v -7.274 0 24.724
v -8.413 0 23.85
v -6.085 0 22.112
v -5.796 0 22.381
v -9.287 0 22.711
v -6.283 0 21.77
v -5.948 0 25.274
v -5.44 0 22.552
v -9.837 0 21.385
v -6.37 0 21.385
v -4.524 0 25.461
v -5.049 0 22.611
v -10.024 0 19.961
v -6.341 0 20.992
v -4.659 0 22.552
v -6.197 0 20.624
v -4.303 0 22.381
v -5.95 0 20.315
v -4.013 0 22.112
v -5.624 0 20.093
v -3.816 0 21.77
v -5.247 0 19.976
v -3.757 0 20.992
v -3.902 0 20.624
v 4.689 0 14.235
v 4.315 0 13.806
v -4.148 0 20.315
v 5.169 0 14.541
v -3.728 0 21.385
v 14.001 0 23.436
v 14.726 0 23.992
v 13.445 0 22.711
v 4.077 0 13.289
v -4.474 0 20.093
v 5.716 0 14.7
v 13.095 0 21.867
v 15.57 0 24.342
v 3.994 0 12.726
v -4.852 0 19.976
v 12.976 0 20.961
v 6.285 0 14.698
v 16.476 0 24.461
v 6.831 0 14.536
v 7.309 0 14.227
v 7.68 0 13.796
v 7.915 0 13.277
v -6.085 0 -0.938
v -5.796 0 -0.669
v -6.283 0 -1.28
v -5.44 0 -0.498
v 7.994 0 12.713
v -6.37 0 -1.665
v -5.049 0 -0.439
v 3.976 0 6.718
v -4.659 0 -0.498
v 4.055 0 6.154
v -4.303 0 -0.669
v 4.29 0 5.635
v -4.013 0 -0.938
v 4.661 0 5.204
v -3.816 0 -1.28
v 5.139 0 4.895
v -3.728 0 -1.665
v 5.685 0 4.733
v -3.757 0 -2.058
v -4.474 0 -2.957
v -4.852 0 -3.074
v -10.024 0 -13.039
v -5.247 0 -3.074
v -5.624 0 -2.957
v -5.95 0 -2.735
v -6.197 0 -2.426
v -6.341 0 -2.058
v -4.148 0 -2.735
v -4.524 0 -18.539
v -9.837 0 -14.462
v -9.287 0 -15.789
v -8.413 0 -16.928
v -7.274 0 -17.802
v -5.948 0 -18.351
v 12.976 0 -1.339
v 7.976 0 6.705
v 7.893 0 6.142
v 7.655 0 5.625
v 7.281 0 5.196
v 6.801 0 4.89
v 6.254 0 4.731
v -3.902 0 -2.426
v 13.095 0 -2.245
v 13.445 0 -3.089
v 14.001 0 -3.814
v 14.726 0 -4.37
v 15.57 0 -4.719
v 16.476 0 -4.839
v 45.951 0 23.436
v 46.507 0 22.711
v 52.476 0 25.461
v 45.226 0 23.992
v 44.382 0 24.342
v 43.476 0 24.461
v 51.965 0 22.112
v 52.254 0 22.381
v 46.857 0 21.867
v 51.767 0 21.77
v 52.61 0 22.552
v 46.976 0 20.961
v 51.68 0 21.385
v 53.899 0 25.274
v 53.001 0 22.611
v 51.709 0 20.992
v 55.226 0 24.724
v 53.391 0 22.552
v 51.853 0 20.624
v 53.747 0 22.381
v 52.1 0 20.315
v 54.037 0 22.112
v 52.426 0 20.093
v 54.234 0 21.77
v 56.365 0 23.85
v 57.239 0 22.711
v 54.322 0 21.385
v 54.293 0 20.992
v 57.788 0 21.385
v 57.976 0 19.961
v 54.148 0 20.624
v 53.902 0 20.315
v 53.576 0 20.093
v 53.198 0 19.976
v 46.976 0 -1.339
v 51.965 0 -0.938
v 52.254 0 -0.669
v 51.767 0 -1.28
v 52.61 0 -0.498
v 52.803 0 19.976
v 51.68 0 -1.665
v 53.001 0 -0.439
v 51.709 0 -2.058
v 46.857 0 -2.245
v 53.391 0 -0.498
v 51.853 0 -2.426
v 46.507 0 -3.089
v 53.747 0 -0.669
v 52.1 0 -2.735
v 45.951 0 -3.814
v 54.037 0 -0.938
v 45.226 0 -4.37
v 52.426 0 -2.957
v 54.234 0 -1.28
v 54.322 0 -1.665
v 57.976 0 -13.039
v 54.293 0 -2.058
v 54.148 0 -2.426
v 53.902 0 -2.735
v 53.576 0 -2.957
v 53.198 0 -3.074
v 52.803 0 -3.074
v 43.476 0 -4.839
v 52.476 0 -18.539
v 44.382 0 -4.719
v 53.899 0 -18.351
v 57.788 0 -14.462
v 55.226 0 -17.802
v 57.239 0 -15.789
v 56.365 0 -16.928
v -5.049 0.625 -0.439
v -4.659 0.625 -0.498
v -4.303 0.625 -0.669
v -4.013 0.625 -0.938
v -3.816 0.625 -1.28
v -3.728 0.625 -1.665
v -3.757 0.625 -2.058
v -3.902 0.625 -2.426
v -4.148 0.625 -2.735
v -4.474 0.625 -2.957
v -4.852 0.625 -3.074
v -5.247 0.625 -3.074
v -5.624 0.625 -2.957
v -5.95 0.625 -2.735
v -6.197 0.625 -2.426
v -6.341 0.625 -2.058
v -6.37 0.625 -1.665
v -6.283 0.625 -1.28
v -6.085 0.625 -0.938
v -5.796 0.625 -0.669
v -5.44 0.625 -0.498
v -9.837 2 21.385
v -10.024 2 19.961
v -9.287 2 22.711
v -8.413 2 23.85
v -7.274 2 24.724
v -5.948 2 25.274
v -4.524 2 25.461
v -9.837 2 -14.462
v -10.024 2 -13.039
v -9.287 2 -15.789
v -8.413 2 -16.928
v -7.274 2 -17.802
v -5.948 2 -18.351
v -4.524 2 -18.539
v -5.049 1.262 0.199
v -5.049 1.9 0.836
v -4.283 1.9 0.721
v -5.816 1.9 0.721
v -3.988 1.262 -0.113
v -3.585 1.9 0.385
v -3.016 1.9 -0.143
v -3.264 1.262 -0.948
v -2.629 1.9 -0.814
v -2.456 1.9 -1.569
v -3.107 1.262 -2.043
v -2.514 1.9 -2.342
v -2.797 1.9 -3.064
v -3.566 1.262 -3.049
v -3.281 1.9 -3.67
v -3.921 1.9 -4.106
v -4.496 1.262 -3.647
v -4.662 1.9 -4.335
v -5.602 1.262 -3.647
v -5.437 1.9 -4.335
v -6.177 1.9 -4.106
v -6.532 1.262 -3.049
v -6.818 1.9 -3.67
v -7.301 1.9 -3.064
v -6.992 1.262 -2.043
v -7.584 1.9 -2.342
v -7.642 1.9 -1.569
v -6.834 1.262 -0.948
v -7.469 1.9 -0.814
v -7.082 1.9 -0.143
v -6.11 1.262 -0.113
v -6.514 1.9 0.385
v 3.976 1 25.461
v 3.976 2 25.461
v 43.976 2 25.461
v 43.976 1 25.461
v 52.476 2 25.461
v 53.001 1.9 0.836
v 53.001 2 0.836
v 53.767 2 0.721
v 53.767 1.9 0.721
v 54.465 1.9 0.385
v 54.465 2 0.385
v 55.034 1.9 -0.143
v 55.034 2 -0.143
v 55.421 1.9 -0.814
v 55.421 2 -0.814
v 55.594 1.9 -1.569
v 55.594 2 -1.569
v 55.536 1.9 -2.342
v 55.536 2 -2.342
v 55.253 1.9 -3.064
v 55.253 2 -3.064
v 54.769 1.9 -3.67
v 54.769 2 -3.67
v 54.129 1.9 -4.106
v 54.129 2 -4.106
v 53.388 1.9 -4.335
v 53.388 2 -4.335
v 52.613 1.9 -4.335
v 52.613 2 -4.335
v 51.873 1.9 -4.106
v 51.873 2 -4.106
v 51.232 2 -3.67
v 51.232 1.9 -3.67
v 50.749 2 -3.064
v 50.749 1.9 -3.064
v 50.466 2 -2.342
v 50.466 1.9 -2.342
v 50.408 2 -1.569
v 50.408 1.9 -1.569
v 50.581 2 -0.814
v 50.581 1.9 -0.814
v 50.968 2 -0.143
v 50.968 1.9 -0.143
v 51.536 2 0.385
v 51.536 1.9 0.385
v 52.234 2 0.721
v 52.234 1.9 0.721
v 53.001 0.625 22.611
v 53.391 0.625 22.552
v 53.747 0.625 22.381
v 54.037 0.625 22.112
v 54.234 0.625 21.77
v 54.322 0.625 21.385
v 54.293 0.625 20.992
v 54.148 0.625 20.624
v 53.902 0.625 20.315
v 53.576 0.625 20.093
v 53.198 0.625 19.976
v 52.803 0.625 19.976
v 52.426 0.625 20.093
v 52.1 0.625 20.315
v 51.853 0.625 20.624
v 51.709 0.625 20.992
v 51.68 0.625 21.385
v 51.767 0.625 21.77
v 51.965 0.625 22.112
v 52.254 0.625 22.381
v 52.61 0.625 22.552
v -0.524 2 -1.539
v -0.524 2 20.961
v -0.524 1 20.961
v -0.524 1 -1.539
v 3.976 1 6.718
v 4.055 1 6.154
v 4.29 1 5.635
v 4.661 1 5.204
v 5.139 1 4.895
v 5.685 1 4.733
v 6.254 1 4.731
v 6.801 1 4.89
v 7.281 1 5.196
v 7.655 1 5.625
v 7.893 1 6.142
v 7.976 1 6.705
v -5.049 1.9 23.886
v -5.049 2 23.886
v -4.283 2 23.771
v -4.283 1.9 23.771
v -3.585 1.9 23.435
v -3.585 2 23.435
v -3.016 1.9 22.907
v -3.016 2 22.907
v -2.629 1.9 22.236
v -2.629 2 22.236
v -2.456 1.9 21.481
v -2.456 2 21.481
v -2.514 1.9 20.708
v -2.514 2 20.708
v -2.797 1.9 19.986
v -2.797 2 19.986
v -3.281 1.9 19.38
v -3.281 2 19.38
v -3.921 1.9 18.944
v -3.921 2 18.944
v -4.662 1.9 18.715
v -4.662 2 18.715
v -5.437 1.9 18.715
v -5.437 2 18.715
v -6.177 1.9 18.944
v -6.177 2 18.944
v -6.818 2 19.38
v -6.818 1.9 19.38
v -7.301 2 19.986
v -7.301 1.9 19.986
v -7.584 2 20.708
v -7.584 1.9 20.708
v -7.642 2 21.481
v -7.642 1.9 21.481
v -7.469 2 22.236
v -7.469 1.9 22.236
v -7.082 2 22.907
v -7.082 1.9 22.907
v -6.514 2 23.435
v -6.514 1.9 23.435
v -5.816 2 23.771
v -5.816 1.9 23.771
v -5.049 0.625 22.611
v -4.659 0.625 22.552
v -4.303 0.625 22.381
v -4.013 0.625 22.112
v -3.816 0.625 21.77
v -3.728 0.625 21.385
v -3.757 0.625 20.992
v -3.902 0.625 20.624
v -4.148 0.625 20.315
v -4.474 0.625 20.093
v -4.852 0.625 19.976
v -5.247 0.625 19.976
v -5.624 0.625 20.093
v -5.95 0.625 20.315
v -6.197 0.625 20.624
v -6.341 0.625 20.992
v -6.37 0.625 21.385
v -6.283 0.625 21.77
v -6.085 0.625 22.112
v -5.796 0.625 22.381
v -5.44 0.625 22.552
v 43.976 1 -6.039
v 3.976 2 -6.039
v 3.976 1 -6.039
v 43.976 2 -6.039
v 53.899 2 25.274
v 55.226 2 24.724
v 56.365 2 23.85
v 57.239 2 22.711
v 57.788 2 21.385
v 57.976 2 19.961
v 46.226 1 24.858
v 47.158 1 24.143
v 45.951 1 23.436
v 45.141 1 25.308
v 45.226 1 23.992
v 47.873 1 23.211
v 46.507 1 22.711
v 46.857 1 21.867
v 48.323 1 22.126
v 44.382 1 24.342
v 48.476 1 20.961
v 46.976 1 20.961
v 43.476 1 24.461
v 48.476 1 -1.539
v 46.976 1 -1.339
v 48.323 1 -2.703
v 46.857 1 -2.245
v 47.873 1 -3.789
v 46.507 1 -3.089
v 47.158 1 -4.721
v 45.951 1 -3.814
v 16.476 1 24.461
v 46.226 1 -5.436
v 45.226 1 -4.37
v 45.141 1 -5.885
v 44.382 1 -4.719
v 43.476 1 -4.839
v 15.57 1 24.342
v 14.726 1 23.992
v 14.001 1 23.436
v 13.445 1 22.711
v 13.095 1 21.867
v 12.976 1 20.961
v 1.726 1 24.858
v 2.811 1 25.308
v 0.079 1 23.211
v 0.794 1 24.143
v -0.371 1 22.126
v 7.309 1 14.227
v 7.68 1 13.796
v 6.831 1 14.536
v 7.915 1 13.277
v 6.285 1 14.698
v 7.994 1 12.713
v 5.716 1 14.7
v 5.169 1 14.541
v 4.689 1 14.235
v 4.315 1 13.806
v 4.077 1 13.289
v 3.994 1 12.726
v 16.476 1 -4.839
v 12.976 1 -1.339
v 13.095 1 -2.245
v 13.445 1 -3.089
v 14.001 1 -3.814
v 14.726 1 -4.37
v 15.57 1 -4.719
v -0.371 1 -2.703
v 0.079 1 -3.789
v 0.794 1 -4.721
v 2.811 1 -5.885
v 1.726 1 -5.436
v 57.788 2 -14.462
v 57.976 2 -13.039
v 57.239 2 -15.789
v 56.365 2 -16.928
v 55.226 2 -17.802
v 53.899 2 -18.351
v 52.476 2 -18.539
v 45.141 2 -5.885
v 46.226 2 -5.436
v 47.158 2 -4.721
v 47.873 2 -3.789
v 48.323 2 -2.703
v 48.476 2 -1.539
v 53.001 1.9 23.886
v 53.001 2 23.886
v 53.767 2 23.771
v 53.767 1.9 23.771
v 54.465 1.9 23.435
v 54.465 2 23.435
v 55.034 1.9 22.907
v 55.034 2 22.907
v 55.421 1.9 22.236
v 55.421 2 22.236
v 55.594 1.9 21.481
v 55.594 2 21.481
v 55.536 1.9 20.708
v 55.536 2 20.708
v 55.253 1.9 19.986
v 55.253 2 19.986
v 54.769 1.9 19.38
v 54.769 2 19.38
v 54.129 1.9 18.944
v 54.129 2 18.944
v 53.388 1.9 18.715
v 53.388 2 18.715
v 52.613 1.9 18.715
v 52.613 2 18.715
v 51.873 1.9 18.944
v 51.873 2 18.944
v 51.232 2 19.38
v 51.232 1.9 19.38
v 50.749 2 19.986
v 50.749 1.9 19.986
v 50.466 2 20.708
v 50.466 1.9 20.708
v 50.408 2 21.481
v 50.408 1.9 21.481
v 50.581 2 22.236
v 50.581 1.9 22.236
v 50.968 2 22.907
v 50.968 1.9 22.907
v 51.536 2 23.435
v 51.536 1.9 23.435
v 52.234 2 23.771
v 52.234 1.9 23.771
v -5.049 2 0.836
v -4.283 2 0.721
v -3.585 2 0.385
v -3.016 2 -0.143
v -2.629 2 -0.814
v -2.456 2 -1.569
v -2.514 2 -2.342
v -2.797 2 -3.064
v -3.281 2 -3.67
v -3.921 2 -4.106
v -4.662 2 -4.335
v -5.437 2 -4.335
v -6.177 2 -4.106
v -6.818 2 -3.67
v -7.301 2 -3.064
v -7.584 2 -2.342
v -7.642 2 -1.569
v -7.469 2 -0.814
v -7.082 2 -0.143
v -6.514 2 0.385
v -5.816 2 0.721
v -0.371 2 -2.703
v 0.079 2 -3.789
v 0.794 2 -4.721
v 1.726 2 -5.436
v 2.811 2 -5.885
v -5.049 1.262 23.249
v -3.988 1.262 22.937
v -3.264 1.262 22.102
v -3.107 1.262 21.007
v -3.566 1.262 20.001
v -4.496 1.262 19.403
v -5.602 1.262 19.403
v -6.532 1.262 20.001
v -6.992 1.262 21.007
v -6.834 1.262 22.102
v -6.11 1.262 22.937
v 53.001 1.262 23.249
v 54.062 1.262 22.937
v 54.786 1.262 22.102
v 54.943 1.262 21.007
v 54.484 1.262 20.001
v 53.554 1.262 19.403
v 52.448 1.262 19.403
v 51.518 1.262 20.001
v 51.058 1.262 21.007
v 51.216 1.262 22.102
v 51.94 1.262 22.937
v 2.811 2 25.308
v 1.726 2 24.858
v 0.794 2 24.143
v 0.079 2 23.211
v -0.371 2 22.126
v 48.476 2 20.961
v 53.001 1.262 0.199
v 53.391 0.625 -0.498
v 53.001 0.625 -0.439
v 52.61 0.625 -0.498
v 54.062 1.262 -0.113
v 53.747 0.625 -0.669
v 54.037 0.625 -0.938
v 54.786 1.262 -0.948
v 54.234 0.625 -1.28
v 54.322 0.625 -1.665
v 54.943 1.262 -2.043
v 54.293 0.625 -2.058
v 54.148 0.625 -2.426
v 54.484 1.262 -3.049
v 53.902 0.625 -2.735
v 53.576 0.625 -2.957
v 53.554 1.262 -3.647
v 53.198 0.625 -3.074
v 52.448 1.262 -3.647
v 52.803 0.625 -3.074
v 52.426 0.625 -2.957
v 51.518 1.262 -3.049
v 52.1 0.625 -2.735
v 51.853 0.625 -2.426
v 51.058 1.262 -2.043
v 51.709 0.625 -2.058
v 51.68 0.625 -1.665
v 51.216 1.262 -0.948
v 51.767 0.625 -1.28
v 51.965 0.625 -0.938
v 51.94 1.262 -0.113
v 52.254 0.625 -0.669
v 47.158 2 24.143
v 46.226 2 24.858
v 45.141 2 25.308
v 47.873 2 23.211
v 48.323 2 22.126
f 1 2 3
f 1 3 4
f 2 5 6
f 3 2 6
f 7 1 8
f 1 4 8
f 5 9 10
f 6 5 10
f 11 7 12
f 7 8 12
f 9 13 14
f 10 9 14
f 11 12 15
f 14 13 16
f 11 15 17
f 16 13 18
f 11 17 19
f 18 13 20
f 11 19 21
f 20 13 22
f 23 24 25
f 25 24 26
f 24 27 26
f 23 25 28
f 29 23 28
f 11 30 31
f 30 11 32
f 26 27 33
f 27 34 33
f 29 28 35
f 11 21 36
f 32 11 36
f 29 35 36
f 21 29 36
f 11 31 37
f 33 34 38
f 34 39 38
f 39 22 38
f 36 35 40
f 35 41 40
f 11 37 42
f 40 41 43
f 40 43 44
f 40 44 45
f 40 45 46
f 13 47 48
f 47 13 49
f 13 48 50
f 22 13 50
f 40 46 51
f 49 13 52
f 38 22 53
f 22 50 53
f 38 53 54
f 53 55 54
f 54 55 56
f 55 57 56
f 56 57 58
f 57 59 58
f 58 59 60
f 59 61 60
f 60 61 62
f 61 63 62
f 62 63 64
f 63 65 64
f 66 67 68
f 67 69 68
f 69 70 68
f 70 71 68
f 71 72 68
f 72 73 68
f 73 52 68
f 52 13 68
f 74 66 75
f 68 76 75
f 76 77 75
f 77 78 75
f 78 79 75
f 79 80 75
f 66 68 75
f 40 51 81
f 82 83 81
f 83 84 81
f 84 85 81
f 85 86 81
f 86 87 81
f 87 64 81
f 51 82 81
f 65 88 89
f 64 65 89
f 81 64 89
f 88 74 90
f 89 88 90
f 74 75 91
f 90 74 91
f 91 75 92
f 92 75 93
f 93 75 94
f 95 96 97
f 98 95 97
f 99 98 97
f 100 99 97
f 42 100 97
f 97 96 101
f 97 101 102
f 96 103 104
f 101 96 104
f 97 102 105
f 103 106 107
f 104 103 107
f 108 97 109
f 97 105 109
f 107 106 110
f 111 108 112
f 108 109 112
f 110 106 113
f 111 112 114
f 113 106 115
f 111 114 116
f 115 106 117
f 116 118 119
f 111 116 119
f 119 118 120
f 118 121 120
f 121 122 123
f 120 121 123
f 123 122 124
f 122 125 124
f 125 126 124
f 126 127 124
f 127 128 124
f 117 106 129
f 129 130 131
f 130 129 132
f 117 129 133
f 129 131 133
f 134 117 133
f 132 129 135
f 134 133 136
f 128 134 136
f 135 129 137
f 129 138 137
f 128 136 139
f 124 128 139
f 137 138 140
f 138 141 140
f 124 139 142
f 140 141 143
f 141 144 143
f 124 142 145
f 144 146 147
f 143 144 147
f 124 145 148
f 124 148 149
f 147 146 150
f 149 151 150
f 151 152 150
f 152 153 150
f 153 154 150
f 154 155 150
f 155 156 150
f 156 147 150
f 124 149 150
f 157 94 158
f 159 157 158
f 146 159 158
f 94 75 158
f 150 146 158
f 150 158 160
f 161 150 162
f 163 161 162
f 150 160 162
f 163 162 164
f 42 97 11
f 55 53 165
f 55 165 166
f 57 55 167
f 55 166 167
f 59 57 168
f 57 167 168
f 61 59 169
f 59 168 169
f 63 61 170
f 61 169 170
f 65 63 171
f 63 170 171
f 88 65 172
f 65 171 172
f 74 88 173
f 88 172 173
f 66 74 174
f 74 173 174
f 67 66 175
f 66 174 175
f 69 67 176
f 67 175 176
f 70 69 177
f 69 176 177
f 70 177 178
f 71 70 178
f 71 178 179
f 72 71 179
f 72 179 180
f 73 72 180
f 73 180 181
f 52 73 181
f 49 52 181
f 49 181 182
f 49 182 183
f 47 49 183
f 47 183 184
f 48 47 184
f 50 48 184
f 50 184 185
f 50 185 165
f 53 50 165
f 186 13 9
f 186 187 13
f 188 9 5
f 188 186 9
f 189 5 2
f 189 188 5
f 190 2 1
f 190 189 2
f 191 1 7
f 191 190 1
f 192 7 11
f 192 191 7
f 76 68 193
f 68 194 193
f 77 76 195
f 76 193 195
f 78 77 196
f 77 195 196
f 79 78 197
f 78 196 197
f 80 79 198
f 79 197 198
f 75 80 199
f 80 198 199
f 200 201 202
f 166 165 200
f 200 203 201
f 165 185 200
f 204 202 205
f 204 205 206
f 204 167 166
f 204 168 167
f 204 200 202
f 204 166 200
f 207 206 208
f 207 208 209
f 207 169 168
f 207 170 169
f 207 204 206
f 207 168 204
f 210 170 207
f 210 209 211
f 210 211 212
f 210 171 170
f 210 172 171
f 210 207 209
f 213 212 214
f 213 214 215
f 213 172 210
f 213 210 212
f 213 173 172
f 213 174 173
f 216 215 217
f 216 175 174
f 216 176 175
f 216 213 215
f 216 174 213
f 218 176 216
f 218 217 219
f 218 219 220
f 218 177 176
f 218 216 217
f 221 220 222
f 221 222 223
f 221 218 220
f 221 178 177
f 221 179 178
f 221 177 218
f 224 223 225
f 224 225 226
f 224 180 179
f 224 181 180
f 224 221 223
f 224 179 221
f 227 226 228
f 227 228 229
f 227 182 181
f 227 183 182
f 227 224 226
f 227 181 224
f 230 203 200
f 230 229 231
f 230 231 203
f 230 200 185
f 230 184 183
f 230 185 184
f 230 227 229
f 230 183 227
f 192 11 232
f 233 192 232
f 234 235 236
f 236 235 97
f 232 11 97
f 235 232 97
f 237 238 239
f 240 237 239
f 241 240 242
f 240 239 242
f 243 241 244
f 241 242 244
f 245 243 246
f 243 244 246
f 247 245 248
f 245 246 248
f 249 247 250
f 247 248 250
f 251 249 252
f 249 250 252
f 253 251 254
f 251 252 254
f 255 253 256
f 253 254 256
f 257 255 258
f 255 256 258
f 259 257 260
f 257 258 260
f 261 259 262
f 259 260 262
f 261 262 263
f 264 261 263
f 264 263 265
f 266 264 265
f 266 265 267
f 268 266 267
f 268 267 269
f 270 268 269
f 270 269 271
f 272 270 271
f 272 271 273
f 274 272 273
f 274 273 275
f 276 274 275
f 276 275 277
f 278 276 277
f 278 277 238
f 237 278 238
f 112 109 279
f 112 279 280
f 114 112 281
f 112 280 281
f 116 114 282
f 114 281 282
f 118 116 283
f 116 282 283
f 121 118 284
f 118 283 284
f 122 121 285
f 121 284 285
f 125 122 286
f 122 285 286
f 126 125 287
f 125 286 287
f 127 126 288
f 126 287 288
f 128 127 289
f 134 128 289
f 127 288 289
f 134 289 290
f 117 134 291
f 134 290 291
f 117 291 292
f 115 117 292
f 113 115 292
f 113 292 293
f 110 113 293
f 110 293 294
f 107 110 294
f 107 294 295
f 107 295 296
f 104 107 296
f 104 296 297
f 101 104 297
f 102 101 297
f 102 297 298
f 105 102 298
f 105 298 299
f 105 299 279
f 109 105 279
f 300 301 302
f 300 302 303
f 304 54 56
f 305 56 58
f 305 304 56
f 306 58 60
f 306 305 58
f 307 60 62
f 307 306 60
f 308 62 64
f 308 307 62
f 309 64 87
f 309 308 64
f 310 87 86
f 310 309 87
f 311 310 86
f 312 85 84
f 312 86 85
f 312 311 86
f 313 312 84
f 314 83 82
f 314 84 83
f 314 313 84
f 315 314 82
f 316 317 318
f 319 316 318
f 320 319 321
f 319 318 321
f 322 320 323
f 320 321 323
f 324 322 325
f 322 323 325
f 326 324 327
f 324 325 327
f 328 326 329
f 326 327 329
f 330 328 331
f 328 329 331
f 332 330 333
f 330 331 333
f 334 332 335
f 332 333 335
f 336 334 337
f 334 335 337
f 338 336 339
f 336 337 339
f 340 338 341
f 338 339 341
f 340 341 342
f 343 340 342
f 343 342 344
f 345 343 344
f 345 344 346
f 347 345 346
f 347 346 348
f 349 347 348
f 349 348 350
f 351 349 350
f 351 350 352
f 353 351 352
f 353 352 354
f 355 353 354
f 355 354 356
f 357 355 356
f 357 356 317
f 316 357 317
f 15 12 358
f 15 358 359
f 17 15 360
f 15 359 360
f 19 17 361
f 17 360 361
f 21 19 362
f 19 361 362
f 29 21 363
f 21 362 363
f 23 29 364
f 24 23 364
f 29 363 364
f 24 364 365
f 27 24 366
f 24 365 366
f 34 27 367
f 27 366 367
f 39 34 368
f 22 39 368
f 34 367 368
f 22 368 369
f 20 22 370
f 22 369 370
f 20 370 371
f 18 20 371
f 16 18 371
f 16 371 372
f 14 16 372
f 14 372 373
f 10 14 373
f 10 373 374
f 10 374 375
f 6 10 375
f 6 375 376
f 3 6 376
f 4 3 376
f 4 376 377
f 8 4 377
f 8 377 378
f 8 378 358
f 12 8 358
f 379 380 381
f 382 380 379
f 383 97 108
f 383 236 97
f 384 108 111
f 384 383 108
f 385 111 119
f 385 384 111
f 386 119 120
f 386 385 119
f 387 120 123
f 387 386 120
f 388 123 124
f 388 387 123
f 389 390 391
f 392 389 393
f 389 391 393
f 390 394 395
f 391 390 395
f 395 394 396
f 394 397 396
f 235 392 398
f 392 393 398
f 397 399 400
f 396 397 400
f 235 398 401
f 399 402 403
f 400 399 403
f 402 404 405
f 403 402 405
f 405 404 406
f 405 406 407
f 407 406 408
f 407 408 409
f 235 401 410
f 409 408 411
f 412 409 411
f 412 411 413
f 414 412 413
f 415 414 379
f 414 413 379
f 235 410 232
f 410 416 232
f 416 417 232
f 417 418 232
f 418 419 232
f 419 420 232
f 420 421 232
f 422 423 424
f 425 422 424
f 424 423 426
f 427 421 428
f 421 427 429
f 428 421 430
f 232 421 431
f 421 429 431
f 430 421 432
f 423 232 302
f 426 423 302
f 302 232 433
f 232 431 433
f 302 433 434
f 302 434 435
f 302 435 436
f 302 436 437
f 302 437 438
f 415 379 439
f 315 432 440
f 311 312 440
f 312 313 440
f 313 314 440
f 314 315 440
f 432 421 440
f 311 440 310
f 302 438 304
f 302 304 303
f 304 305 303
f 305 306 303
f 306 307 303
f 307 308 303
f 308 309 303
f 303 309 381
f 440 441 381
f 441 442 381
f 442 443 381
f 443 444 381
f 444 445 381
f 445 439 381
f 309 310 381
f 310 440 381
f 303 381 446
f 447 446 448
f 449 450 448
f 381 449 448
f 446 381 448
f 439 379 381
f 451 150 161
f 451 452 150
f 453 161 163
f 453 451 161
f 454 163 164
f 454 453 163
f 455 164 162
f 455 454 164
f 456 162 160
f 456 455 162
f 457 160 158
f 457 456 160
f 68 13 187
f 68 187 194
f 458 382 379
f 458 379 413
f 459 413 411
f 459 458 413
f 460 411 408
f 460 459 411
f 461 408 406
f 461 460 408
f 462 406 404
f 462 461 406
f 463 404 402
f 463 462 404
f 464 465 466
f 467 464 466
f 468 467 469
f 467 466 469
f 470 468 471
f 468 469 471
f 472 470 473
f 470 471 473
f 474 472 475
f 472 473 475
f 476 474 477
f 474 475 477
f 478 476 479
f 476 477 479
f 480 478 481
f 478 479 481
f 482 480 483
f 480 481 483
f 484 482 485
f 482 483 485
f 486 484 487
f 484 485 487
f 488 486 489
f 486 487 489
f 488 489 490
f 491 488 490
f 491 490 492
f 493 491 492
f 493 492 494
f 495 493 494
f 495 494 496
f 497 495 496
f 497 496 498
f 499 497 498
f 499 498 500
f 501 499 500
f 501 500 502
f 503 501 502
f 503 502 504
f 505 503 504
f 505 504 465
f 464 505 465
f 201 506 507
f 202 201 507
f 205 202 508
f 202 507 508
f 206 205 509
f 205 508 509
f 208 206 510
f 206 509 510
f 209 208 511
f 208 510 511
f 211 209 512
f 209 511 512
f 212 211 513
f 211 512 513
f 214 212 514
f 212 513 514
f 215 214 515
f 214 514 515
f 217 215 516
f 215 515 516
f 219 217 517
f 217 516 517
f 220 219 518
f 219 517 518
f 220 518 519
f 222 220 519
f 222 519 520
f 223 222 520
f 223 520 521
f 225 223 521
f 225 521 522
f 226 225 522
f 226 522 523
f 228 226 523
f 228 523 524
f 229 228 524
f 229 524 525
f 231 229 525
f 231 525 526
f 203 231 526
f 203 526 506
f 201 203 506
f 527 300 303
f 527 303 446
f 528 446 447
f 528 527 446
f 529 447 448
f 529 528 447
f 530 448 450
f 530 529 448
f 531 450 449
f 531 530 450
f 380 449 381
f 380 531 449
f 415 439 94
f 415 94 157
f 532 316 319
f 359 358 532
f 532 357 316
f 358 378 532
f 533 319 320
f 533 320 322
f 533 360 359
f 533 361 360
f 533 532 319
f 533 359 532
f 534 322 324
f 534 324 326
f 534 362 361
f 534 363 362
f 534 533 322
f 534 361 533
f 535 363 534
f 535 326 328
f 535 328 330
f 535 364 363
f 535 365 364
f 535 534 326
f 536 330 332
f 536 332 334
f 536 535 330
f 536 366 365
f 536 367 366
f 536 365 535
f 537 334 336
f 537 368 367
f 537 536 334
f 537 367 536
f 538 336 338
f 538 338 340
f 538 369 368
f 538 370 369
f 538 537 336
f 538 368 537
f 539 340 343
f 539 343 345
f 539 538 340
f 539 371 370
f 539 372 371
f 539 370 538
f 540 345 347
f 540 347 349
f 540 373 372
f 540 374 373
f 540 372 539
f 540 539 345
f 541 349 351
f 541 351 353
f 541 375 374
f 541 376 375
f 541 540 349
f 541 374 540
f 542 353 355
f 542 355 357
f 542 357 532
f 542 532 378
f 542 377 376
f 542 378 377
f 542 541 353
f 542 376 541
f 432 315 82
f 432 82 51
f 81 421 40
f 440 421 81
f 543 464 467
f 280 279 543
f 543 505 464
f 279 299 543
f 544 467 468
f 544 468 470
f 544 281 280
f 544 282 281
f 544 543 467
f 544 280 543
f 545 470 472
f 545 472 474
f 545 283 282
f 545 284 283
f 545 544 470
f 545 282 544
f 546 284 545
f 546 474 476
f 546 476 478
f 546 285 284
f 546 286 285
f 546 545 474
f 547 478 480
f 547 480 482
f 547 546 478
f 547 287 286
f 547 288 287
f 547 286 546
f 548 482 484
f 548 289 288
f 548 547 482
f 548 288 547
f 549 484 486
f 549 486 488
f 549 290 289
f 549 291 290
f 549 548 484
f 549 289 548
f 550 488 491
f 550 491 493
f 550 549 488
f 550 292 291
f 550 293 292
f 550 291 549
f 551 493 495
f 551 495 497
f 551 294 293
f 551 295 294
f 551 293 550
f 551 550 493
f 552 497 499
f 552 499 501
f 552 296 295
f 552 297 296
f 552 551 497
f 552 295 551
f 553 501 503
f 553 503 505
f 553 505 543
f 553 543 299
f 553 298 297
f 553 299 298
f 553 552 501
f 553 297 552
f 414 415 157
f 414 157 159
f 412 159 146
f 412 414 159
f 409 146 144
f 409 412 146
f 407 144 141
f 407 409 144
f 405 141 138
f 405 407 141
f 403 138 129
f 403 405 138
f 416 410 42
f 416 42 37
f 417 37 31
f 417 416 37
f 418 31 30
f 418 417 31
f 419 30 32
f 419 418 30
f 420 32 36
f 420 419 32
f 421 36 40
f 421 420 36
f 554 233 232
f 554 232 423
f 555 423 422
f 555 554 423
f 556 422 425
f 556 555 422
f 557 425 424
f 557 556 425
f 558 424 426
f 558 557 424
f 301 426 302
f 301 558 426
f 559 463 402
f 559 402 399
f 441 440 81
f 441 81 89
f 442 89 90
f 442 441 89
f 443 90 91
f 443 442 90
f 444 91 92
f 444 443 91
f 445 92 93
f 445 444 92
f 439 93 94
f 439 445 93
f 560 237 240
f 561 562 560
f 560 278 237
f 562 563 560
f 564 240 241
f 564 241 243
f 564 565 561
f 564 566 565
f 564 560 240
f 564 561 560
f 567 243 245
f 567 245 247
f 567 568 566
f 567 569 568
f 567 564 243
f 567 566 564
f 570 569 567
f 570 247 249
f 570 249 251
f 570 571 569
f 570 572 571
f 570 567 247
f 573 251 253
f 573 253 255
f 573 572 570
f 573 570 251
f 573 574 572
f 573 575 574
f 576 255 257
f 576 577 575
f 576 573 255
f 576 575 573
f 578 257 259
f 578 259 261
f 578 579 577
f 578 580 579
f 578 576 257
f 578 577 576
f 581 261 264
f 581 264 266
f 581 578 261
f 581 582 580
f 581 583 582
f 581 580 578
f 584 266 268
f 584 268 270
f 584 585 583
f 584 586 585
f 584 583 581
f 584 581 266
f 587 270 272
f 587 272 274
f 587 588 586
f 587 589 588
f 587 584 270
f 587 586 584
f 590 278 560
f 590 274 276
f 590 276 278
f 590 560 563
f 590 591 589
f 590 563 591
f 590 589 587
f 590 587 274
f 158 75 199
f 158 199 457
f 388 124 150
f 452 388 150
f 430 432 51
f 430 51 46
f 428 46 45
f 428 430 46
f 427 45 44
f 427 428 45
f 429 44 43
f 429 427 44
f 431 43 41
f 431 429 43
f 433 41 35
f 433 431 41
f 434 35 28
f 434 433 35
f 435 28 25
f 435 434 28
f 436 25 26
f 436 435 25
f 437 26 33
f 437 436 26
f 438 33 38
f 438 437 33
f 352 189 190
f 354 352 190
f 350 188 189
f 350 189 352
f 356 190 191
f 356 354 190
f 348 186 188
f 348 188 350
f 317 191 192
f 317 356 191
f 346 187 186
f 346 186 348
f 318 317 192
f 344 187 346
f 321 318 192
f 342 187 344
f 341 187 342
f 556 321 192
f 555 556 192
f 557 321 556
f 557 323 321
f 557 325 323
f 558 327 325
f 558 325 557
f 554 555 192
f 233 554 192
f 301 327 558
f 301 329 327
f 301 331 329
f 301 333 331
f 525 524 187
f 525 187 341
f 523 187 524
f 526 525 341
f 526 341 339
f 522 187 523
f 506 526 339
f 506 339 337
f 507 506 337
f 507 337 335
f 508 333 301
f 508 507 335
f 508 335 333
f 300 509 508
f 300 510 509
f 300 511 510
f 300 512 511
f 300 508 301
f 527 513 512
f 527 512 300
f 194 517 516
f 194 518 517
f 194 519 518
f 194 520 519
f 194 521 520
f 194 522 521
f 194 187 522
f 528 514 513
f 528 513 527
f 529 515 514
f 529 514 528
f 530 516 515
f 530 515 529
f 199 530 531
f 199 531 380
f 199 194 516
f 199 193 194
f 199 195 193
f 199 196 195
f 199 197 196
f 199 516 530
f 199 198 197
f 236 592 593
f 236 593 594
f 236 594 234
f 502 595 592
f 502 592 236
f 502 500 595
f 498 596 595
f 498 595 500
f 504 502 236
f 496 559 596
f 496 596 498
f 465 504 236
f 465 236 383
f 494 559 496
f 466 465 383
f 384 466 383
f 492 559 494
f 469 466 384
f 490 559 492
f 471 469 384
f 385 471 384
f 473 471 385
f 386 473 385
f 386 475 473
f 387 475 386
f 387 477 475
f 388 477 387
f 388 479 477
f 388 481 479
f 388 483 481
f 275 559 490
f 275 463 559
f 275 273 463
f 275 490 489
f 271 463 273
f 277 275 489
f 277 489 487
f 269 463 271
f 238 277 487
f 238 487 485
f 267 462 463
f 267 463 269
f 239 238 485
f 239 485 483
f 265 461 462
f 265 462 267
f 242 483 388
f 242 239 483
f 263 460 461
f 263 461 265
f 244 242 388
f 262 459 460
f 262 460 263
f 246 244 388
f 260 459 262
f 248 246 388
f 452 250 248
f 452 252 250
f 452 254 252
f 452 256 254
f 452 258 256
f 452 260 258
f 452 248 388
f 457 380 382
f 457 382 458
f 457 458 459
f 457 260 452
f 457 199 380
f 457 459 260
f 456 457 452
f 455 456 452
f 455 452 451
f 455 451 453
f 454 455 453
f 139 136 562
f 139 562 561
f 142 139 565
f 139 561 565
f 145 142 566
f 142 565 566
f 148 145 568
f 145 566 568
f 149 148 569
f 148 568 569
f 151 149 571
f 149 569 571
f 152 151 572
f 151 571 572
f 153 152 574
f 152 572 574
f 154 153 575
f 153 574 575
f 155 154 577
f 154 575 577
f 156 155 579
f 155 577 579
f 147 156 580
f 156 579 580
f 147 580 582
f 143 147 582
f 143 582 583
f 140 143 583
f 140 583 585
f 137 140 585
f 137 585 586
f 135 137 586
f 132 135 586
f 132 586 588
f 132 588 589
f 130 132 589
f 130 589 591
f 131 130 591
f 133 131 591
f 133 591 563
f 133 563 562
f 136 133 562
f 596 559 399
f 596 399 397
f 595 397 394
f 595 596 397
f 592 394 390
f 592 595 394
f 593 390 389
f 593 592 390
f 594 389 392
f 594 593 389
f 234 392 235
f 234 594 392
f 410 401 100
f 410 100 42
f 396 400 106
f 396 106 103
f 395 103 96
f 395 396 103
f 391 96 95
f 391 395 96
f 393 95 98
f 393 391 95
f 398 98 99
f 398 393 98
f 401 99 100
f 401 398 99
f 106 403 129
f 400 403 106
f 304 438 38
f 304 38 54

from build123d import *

# Parameters (mm, degrees)
SKETCH_1_W          = 68
SKETCH_1_H          = 44
EXTRUDE_1_DEPTH     = 2
FILLET_1_R          = 5.5
CUT_EXTRUDE_1_DEPTH = 1
CUT_EXTRUDE_2_DEPTH = 1
CUT_EXTRUDE_3_REACH = 65.352
SKETCH_5_R          = 1.325
CUT_EXTRUDE_5_DEPTH = 64.328343814
SKETCH_6_R          = 2.6
CUT_EXTRUDE_6_DEPTH = 1.5
CHAMFER_2_SIZE      = 1.4


with BuildPart() as part:
    # 草图1 → 凸台-拉伸1 (new body)
    with BuildSketch(Plane(origin=(0, 0, 0), x_dir=(1, 0, 0), z_dir=(0, 1, 0))):
        with Locations((23.975845411, -3.461352657)):
            Rectangle(SKETCH_1_W, SKETCH_1_H)
    extrude(amount=EXTRUDE_1_DEPTH)

    # 圆角1
    fillet_1_edges = [part.edges().sort_by_distance(p)[0] for p in [
        (-10.024154589, 1, -18.538647343),
        (57.975845411, 1, -18.538647343),
        (57.975845411, 1, 25.461352657),
        (-10.024154589, 1, 25.461352657),
    ]]
    fillet(fillet_1_edges, radius=FILLET_1_R)

    # 草图3 → 切除-拉伸1 (cut)
    with BuildSketch(Plane(origin=(0, 2, 0), x_dir=(1, 0, 0), z_dir=(0, 1, 0))):
        with BuildLine():
            Line((3.975845411, 6.038647343), (43.975845411, 6.038647343))
            ThreePointArc((43.975845411, 6.038647343), (47.157825926, 4.720627858), (48.475845411, 1.538647343))
            Line((48.475845411, 1.538647343), (48.475845411, -20.961352657))
            ThreePointArc((48.475845411, -20.961352657), (47.157825926, -24.143333172), (43.975845411, -25.461352657))
            Line((43.975845411, -25.461352657), (3.975845411, -25.461352657))
            ThreePointArc((3.975845411, -25.461352657), (0.793864895, -24.143333172), (-0.524154589, -20.961352657))
            Line((-0.524154589, -20.961352657), (-0.524154589, 1.538647343))
            ThreePointArc((-0.524154589, 1.538647343), (0.793864895, 4.720627858), (3.975845411, 6.038647343))
        make_face()
    extrude(amount=-CUT_EXTRUDE_1_DEPTH, mode=Mode.SUBTRACT)

    # 草图4 → 切除-拉伸2 (cut)
    with BuildSketch(Plane(origin=(0, 1, 0), x_dir=(1, 0, 0), z_dir=(0, 1, 0))):
        with BuildLine():
            Line((43.475845411, -24.461352657), (16.475845411, -24.461352657))
            ThreePointArc((16.475845411, -24.461352657), (14.000971676, -23.436226391), (12.975845411, -20.961352657))
            Line((12.975845411, -20.961352657), (12.975845411, 1.338647343))
            ThreePointArc((12.975845411, 1.338647343), (14.000971676, 3.813521077), (16.475845411, 4.838647343))
            Line((16.475845411, 4.838647343), (43.475845411, 4.838647343))
            ThreePointArc((43.475845411, 4.838647343), (45.950719145, 3.813521077), (46.975845411, 1.338647343))
            Line((46.975845411, 1.338647343), (46.975845411, -20.961352657))
            ThreePointArc((46.975845411, -20.961352657), (45.950719145, -23.436226391), (43.475845411, -24.461352657))
        make_face()
    extrude(amount=-CUT_EXTRUDE_2_DEPTH, mode=Mode.SUBTRACT)

    # 草图5 → 切除-拉伸3 (cut, up to next)
    with BuildSketch(Plane(origin=(0, 2, 0), x_dir=(1, 0, 0), z_dir=(0, 1, 0)), mode=Mode.PRIVATE) as cut_extrude_3_sk1:
        with Locations(Location((53.000845411, -21.286352657, 0), (0, 0, 270))):
            Circle(SKETCH_5_R)
    cut_extrude_3_tool1 = extrude(cut_extrude_3_sk1.sketch, amount=-CUT_EXTRUDE_3_REACH, mode=Mode.PRIVATE) & part.part
    # 草图5 → 切除-拉伸3 (cut, up to next)
    with BuildSketch(Plane(origin=(0, 2, 0), x_dir=(1, 0, 0), z_dir=(0, 1, 0)), mode=Mode.PRIVATE) as cut_extrude_3_sk2:
        with Locations(Location((53.000845411, 1.763647343, 0), (0, 0, 270))):
            Circle(SKETCH_5_R)
    cut_extrude_3_tool2 = extrude(cut_extrude_3_sk2.sketch, amount=-CUT_EXTRUDE_3_REACH, mode=Mode.PRIVATE) & part.part
    # 草图5 → 切除-拉伸3 (cut, up to next)
    with BuildSketch(Plane(origin=(0, 2, 0), x_dir=(1, 0, 0), z_dir=(0, 1, 0)), mode=Mode.PRIVATE) as cut_extrude_3_sk3:
        with Locations(Location((-5.049154589, 1.763647343, 0), (0, 0, 270))):
            Circle(SKETCH_5_R)
    cut_extrude_3_tool3 = extrude(cut_extrude_3_sk3.sketch, amount=-CUT_EXTRUDE_3_REACH, mode=Mode.PRIVATE) & part.part
    # 草图5 → 切除-拉伸3 (cut, up to next)
    with BuildSketch(Plane(origin=(0, 2, 0), x_dir=(1, 0, 0), z_dir=(0, 1, 0)), mode=Mode.PRIVATE) as cut_extrude_3_sk4:
        with Locations(Location((-5.049154589, -21.286352657, 0), (0, 0, 270))):
            Circle(SKETCH_5_R)
    cut_extrude_3_tool4 = extrude(cut_extrude_3_sk4.sketch, amount=-CUT_EXTRUDE_3_REACH, mode=Mode.PRIVATE) & part.part
    add(cut_extrude_3_tool1.solids().sort_by_distance((53.000845, 2, 21.286353))[0], mode=Mode.SUBTRACT)
    add(cut_extrude_3_tool2.solids().sort_by_distance((53.000845, 2, -1.763647))[0], mode=Mode.SUBTRACT)
    add(cut_extrude_3_tool3.solids().sort_by_distance((-5.049155, 2, -1.763647))[0], mode=Mode.SUBTRACT)
    add(cut_extrude_3_tool4.solids().sort_by_distance((-5.049155, 2, 21.286353))[0], mode=Mode.SUBTRACT)

    # 草图7 → 切除-拉伸5 (cut, through all)
    with BuildSketch(Plane(origin=(0, 1, 0), x_dir=(1, 0, 0), z_dir=(0, 1, 0))):
        with BuildLine():
            Line((7.975835944, -6.705199166), (7.994321526, -12.713332009))
            ThreePointArc((7.994321526, -12.713332009), (6.000484483, -14.719476033), (3.994340459, -12.72563899))
            Line((3.994340459, -12.72563899), (3.975854877, -6.717506148))
            ThreePointArc((3.975854877, -6.717506148), (5.96969192, -4.711362123), (7.975835944, -6.705199166))
        make_face()
    extrude(amount=-CUT_EXTRUDE_5_DEPTH, mode=Mode.SUBTRACT)

    # 草图6 → 切除-拉伸6 (cut)
    with BuildSketch(Plane(origin=(0, 2, 0), x_dir=(1, 0, 0), z_dir=(0, 1, 0))):
        with Locations(Location((-5.049154589, 1.763647343, 0), (0, 0, 270))):
            Circle(SKETCH_6_R)
        with Locations(Location((-5.049154589, -21.286352657, 0), (0, 0, 270))):
            Circle(SKETCH_6_R)
        with Locations(Location((53.000845411, 1.763647343, 0), (0, 0, 270))):
            Circle(SKETCH_6_R)
        with Locations(Location((53.000845411, -21.286352657, 0), (0, 0, 270))):
            Circle(SKETCH_6_R)
    extrude(amount=-CUT_EXTRUDE_6_DEPTH, mode=Mode.SUBTRACT)

    # 倒角2
    # the kernel refuses this chamfer: 1.4 mm, written as the material it adds along each edge
    with BuildSketch(Plane(origin=(53.000845411, 0.5, 21.286352657), x_dir=(0, 0, 1), z_dir=(-1, 0, 0))) as chamfer_2_piece_1_section:
        Polygon((2.6, CHAMFER_2_SIZE), (2.6 - CHAMFER_2_SIZE, 0), (2.6, 0), align=None)
    chamfer_2_piece_1 = revolve(axis=Axis((53.000845411, 0.5, 21.286352657), (0, 1, 0)), mode=Mode.PRIVATE)
    chamfer_2_piece_1 = chamfer_2_piece_1 - Plane(origin=(53.000845411, 1.265114472, 21.286352657), x_dir=(0, 0, 1), z_dir=(0, 1, 0)) * Cylinder(1.325, 11, mode=Mode.PRIVATE)
    add(chamfer_2_piece_1)
    with BuildSketch(Plane(origin=(-5.049154589, 0.5, 21.286352657), x_dir=(0, 0, 1), z_dir=(-1, 0, 0))) as chamfer_2_piece_2_section:
        Polygon((2.6, CHAMFER_2_SIZE), (2.6 - CHAMFER_2_SIZE, 0), (2.6, 0), align=None)
    chamfer_2_piece_2 = revolve(axis=Axis((-5.049154589, 0.5, 21.286352657), (0, 1, 0)), mode=Mode.PRIVATE)
    chamfer_2_piece_2 = chamfer_2_piece_2 - Plane(origin=(-5.049154589, 1.265114472, 21.286352657), x_dir=(0, 0, 1), z_dir=(0, 1, 0)) * Cylinder(1.325, 11, mode=Mode.PRIVATE)
    add(chamfer_2_piece_2)
    with BuildSketch(Plane(origin=(-5.049154589, 0.5, -1.763647343), x_dir=(0, 0, 1), z_dir=(-1, 0, 0))) as chamfer_2_piece_3_section:
        Polygon((2.6, CHAMFER_2_SIZE), (2.6 - CHAMFER_2_SIZE, 0), (2.6, 0), align=None)
    chamfer_2_piece_3 = revolve(axis=Axis((-5.049154589, 0.5, -1.763647343), (0, 1, 0)), mode=Mode.PRIVATE)
    chamfer_2_piece_3 = chamfer_2_piece_3 - Plane(origin=(-5.049154589, 1.265114472, -1.763647343), x_dir=(0, 0, 1), z_dir=(0, 1, 0)) * Cylinder(1.325, 11, mode=Mode.PRIVATE)
    add(chamfer_2_piece_3)
    with BuildSketch(Plane(origin=(53.000845411, 0.5, -1.763647343), x_dir=(0, 0, 1), z_dir=(-1, 0, 0))) as chamfer_2_piece_4_section:
        Polygon((2.6, CHAMFER_2_SIZE), (2.6 - CHAMFER_2_SIZE, 0), (2.6, 0), align=None)
    chamfer_2_piece_4 = revolve(axis=Axis((53.000845411, 0.5, -1.763647343), (0, 1, 0)), mode=Mode.PRIVATE)
    chamfer_2_piece_4 = chamfer_2_piece_4 - Plane(origin=(53.000845411, 1.265114472, -1.763647343), x_dir=(0, 0, 1), z_dir=(0, 1, 0)) * Cylinder(1.325, 11, mode=Mode.PRIVATE)
    add(chamfer_2_piece_4)


solid = part.part
